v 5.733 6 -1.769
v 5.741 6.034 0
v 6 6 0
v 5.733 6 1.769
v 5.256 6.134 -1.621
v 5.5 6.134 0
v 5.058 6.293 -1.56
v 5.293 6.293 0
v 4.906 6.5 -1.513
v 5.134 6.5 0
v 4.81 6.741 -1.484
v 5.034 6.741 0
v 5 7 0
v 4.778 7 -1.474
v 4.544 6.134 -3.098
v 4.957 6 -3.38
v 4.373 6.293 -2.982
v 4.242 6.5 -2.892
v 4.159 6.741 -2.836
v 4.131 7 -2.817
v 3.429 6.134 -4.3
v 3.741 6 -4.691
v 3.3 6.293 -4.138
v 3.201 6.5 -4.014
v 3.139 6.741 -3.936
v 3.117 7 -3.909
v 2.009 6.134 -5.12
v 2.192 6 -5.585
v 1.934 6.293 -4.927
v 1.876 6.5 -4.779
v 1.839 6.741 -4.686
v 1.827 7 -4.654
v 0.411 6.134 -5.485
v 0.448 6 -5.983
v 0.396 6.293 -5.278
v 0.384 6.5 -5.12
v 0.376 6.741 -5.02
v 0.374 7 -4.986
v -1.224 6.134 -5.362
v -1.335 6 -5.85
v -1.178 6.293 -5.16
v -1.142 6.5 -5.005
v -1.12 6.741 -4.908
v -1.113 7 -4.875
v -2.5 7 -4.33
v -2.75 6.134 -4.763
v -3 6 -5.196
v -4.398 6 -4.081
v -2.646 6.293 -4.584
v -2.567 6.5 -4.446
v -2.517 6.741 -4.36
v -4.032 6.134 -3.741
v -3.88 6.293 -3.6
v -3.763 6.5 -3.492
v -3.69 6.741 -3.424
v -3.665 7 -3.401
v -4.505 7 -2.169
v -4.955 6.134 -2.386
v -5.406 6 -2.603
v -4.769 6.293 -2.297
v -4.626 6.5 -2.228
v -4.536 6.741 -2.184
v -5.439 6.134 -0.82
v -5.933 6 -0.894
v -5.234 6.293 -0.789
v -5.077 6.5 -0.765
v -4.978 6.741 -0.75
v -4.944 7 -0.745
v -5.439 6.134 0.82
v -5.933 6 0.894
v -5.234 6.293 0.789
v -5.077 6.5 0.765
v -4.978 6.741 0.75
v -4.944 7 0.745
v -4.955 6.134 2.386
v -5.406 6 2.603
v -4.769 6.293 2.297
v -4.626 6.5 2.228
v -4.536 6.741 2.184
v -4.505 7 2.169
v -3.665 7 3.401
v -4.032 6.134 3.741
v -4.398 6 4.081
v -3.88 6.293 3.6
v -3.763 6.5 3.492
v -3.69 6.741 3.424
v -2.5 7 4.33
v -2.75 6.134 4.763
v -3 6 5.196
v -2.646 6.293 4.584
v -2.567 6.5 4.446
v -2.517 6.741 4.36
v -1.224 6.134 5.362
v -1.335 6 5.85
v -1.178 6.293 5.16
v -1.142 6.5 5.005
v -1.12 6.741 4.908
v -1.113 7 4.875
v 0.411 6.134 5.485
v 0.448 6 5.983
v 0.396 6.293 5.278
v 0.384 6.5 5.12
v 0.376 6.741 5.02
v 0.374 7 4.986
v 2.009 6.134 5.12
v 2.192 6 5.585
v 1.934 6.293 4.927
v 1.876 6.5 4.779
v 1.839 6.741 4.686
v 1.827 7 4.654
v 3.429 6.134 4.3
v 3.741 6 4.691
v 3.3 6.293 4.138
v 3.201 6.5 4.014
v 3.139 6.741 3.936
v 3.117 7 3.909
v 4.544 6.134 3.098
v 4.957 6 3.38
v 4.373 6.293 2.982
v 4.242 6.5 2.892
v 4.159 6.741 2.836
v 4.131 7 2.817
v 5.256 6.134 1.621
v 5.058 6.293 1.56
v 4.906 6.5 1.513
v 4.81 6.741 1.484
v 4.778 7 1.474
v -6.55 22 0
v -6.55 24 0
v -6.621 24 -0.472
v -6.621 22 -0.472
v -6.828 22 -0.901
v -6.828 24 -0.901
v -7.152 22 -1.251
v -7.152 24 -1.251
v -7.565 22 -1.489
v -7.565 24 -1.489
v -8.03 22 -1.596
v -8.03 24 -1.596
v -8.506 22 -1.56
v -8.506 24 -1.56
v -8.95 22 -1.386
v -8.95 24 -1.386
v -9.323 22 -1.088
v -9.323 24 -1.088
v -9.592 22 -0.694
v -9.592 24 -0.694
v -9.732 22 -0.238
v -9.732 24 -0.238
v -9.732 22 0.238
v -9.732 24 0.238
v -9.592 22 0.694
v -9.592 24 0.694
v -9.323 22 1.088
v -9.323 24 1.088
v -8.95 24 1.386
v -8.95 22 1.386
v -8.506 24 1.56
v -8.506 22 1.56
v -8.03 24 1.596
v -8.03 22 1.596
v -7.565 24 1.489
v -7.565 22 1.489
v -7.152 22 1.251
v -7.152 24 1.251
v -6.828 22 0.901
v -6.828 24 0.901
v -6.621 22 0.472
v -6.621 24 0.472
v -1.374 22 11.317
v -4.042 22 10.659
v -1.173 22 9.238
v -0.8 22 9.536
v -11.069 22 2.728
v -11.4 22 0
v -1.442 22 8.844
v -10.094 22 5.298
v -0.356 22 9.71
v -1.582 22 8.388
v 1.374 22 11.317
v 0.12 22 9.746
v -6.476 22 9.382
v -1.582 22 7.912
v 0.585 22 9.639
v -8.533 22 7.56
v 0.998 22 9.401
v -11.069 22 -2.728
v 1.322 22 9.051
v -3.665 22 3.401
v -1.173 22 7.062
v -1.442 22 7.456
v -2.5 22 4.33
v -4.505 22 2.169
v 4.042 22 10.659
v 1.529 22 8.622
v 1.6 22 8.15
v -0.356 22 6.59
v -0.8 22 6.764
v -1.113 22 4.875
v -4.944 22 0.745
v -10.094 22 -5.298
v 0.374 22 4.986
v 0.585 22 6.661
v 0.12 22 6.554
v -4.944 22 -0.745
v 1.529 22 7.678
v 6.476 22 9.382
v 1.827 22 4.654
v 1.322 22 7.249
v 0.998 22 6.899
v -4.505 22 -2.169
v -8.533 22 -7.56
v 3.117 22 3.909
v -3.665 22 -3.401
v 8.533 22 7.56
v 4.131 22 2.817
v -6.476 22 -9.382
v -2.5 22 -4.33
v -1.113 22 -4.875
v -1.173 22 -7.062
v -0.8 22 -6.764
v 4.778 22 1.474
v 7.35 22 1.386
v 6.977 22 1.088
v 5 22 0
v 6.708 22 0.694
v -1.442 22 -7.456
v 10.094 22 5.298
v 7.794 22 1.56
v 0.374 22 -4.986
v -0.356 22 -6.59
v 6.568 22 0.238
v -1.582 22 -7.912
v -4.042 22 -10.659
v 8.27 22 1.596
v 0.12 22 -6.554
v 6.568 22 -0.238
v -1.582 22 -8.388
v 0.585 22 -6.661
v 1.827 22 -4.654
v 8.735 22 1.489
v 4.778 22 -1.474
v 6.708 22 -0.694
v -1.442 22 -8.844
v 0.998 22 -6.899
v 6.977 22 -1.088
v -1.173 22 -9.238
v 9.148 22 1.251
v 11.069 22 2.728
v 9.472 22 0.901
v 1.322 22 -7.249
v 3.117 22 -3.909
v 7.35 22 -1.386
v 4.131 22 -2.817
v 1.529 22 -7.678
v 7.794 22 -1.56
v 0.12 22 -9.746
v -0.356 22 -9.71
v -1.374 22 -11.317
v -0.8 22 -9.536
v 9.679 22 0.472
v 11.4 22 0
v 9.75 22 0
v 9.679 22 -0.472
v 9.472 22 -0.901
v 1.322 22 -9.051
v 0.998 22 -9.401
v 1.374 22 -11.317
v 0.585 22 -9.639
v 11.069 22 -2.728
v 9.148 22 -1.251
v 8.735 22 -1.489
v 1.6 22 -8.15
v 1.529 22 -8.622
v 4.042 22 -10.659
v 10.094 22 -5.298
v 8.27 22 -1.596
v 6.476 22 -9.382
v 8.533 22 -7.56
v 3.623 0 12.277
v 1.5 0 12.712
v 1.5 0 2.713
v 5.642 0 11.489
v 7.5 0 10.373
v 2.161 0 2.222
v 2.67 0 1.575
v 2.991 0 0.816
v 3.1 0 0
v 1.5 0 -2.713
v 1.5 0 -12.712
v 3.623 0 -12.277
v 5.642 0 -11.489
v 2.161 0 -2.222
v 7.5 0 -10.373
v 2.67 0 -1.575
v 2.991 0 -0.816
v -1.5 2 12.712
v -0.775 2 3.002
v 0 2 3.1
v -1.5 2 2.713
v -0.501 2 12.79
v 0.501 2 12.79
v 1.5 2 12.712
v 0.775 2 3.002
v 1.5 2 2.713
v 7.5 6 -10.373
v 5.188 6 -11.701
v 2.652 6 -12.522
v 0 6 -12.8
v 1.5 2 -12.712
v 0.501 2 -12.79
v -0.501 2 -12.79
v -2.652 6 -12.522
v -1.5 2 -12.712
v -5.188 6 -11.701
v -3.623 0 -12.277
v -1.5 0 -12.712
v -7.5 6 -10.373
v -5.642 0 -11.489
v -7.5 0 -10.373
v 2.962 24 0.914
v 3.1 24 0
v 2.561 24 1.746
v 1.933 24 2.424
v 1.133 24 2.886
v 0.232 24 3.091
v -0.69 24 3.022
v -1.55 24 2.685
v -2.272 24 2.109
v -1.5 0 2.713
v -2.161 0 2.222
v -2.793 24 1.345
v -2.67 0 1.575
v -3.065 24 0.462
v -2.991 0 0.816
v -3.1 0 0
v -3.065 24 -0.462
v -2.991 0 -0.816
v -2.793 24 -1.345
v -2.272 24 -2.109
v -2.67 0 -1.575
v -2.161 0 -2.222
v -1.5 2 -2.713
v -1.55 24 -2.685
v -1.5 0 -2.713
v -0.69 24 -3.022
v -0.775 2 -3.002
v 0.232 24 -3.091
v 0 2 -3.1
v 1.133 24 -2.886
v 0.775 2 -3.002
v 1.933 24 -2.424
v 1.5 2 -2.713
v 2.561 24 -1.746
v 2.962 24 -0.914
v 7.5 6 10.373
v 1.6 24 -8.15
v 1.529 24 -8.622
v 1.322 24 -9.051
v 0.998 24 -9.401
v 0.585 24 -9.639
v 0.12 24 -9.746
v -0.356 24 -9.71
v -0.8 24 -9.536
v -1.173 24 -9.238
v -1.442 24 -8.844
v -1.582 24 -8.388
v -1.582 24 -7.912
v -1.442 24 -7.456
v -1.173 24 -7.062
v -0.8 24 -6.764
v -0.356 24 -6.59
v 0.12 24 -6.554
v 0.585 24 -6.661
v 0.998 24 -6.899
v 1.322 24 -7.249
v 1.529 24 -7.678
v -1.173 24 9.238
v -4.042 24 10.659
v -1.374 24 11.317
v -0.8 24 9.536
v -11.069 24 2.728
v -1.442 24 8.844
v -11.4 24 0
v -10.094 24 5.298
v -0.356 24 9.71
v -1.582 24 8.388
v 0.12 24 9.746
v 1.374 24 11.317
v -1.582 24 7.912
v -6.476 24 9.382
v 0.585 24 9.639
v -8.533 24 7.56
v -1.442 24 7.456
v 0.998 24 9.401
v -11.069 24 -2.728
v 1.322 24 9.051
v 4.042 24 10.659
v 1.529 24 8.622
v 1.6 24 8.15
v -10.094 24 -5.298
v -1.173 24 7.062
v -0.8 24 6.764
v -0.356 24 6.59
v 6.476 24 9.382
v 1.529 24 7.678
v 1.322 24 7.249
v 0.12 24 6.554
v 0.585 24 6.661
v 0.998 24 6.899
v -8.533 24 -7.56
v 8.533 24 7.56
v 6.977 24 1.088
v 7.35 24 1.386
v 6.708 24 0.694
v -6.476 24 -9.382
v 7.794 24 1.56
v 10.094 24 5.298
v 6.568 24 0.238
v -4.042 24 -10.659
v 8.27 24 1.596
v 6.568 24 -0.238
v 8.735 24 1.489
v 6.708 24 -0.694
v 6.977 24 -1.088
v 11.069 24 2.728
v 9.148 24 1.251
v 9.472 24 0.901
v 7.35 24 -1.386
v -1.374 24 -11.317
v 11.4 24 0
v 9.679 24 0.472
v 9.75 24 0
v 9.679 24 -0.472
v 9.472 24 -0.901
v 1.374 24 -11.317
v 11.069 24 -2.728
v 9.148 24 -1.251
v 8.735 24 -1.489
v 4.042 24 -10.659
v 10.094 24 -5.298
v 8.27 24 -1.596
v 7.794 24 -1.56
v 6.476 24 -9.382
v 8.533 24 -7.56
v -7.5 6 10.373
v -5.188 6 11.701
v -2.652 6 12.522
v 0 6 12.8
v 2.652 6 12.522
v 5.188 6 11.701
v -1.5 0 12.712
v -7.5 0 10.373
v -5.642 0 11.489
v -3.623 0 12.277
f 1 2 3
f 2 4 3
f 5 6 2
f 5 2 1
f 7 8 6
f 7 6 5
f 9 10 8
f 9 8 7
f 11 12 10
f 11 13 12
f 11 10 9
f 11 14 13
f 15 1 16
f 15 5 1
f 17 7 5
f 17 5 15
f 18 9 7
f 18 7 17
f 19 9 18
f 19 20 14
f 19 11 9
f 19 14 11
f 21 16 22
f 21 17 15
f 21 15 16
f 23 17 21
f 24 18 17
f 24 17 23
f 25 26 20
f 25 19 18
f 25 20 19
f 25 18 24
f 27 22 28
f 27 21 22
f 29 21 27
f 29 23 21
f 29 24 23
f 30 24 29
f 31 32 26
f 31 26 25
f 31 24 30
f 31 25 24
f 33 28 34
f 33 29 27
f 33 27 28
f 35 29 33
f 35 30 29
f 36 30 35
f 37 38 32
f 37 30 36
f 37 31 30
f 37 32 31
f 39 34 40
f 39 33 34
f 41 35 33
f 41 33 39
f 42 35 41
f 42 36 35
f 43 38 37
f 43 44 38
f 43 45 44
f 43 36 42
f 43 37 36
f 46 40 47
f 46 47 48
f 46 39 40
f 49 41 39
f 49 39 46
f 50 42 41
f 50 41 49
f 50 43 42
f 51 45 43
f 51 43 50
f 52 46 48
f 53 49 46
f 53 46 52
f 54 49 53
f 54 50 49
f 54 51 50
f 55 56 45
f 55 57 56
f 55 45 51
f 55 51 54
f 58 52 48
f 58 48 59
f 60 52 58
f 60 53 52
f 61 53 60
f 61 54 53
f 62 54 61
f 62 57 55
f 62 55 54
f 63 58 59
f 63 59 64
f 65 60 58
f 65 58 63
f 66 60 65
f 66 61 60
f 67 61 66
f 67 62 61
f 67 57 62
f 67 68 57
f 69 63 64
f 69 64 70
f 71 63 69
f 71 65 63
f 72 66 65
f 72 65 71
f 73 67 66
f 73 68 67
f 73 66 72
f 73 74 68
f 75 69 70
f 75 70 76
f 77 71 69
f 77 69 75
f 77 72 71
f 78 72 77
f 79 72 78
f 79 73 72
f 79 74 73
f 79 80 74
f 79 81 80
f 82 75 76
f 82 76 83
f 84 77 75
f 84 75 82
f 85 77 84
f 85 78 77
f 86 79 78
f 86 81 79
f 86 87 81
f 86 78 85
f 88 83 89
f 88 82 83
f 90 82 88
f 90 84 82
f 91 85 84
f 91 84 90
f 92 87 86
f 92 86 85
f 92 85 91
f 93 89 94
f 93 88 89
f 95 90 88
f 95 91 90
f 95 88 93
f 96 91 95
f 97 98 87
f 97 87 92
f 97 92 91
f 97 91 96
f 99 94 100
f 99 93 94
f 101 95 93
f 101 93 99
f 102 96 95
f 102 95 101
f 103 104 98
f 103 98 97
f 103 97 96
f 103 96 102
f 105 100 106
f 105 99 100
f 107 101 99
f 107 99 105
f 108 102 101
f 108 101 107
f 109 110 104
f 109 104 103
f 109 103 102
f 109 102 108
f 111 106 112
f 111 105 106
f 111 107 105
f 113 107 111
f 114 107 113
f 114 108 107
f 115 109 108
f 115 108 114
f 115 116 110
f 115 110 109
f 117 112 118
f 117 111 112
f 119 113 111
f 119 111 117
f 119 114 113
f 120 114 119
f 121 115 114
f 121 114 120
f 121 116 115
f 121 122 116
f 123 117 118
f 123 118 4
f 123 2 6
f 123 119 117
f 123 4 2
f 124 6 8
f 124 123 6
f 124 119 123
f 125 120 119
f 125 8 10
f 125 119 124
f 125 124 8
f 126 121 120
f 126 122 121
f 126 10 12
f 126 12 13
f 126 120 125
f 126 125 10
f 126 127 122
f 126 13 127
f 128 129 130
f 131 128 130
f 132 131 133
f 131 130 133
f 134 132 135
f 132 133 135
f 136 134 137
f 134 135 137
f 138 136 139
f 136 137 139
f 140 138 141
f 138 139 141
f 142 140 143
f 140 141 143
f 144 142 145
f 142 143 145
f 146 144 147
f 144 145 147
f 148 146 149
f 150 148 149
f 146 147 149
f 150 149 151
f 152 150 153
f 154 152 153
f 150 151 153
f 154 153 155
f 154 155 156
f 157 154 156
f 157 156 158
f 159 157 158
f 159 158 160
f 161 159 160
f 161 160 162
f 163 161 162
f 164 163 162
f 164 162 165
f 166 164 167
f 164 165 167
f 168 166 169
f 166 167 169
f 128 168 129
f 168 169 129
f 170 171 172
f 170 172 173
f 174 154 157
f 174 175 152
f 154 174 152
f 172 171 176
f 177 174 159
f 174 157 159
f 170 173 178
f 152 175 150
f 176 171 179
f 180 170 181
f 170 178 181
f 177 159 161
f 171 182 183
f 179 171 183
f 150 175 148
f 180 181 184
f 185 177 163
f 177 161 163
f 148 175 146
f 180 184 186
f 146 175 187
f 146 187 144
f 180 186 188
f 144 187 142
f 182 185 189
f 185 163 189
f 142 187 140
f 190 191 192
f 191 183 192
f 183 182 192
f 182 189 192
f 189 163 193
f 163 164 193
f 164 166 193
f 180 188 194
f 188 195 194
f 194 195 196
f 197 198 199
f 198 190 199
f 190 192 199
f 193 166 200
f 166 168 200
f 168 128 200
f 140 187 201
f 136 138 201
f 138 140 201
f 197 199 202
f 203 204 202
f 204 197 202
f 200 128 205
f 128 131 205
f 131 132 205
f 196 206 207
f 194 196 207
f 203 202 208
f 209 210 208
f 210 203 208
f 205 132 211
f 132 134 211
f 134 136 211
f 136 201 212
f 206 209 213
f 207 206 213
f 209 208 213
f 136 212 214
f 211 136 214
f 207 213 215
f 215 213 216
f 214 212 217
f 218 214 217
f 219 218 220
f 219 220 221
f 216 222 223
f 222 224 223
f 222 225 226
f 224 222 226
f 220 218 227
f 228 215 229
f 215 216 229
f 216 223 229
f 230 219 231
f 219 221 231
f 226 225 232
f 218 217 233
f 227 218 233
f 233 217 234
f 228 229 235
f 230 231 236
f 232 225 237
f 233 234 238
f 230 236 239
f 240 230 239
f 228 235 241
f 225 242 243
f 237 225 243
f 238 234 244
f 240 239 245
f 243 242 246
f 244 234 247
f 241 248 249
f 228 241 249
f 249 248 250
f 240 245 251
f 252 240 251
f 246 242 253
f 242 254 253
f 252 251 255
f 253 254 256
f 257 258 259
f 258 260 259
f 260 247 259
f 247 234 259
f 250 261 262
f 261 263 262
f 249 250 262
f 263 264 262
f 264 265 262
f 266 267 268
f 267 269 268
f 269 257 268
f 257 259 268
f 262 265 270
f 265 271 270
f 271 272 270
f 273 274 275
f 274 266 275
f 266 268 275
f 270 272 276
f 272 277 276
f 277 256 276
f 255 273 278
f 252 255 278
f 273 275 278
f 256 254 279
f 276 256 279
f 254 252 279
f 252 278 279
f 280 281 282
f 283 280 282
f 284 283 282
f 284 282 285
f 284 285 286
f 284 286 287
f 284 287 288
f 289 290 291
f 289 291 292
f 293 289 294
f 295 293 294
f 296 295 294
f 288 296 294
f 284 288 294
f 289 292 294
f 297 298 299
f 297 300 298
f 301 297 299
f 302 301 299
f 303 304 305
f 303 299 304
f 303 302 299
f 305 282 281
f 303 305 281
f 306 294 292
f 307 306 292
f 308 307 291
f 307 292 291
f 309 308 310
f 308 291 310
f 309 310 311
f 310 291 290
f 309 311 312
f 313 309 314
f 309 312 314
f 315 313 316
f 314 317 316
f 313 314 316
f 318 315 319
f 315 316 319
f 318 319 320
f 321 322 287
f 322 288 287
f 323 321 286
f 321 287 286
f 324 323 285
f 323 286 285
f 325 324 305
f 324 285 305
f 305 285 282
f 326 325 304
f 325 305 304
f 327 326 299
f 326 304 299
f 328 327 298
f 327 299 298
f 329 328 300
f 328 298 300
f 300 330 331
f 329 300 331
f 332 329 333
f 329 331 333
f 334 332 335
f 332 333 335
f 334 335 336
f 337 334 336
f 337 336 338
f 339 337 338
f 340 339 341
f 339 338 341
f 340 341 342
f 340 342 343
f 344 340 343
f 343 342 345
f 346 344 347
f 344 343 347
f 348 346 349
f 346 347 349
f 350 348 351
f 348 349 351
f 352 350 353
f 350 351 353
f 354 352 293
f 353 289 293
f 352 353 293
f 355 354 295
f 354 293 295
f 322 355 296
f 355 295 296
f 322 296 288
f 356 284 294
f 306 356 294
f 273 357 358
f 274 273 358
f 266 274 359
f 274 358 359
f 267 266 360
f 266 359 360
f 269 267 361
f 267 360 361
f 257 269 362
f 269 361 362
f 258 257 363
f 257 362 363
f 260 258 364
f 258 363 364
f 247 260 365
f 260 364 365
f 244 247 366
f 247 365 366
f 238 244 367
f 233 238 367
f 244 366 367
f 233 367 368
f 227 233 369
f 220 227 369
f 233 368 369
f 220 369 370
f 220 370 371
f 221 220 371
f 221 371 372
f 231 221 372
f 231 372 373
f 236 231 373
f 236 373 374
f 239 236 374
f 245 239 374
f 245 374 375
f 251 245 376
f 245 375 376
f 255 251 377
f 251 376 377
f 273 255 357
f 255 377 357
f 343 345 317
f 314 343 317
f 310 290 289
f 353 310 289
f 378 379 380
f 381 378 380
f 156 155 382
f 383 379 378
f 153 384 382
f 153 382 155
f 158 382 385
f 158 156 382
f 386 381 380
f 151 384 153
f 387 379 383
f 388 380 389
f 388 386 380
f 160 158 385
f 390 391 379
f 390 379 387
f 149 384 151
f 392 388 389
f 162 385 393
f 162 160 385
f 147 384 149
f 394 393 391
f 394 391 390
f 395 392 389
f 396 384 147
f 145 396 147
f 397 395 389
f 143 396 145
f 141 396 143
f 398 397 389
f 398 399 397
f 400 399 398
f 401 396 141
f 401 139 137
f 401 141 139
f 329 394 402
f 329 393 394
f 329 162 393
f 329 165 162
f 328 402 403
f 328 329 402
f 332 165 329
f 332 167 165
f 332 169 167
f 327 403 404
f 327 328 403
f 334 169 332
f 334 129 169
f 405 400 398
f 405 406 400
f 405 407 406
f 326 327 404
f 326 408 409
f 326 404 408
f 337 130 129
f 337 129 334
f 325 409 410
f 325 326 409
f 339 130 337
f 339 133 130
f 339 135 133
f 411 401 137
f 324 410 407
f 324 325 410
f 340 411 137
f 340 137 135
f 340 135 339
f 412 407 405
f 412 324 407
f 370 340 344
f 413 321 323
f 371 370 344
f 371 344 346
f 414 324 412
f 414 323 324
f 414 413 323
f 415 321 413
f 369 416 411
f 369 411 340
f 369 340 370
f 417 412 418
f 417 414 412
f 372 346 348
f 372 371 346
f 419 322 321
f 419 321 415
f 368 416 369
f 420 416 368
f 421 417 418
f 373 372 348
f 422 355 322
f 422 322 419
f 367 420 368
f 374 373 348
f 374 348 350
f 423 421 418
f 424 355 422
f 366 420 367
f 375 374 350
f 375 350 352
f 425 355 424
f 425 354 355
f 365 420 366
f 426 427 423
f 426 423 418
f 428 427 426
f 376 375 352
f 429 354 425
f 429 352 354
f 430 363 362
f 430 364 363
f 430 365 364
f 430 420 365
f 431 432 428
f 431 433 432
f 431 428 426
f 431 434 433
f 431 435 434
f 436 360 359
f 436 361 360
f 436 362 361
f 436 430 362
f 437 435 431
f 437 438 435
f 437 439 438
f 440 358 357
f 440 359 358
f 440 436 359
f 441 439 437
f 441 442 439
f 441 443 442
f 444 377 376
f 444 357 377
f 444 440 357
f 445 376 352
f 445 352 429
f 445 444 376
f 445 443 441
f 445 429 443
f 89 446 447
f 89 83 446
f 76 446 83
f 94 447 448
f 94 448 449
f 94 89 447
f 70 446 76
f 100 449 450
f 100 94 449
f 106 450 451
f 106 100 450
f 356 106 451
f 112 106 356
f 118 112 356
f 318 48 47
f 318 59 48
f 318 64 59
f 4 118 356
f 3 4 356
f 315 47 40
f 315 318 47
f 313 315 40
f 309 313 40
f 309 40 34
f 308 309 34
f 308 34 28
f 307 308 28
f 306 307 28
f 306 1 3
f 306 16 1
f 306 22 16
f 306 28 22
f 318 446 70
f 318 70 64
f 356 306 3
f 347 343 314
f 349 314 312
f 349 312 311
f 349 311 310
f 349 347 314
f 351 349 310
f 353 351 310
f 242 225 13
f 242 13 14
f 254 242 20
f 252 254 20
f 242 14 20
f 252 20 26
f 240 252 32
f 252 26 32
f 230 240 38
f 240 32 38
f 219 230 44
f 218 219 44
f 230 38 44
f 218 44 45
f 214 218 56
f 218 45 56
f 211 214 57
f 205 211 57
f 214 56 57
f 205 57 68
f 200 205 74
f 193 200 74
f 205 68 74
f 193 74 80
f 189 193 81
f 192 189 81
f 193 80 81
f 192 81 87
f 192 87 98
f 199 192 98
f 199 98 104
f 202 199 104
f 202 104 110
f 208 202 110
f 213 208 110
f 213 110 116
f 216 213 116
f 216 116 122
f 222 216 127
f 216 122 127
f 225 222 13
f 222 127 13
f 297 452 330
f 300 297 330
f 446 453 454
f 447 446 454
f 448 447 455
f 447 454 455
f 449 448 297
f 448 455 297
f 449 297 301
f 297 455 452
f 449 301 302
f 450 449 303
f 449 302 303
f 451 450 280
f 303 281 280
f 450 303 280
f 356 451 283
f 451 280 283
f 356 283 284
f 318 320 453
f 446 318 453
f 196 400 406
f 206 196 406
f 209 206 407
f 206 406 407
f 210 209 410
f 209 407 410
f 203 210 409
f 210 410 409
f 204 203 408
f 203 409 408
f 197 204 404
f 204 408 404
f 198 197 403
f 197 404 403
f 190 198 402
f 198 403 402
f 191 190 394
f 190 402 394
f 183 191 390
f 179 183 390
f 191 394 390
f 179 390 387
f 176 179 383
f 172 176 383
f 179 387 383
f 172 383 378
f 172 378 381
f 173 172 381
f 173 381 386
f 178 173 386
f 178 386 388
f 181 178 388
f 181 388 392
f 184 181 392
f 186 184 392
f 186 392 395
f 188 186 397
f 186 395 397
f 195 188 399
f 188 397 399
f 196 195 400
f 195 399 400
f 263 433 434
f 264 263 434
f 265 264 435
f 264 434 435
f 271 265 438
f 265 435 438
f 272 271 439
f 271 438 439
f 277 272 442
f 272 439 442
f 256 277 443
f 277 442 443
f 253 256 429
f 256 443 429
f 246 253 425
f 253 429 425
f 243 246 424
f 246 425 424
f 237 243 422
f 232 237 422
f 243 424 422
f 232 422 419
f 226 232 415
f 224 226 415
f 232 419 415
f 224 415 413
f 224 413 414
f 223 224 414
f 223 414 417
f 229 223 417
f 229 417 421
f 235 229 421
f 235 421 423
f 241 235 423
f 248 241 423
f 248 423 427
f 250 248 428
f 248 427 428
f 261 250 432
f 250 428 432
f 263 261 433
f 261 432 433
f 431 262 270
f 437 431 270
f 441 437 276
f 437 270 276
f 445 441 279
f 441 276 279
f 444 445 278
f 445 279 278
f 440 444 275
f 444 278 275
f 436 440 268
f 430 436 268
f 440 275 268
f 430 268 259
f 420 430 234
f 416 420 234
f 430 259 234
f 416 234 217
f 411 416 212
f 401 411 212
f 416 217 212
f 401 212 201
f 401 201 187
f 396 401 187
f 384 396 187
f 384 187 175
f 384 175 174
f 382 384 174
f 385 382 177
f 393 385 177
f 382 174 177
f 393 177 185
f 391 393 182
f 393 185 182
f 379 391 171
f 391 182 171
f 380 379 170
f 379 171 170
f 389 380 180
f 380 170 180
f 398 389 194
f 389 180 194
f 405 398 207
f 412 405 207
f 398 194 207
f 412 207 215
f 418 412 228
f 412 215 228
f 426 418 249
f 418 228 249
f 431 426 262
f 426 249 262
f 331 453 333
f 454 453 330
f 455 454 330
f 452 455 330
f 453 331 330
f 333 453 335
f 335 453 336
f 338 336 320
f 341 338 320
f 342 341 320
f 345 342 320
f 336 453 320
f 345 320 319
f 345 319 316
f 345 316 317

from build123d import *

# Parameters (mm, degrees)
EXTRUDE_1_DEPTH     = 6
CUT_EXTRUDE_1_DEPTH = 2
SKETCH_4_R          = 5
EXTRUDE_2_DEPTH     = 16
CUT_EXTRUDE_3_REACH = 24
SKETCH_7_R          = 3.1
FILLET_1_R          = 1
SKETCH_8_R          = 11.4
EXTRUDE_3_DEPTH     = 2
SKETCH_9_R          = 3.1
CUT_EXTRUDE_4_DEPTH = 2
SKETCH_10_R         = 1.6
CUT_EXTRUDE_5_DEPTH = 2


with BuildPart() as part:
    # 草图1 → 凸台-拉伸1 (new body)
    with BuildSketch(Plane(origin=(0, 0, 0), x_dir=(1, 0, 0), z_dir=(0, 1, 0))):
        with BuildLine():
            Line((-7.5, 10.372559954), (-7.5, -10.372559954))
            ThreePointArc((-7.5, -10.372559954), (0, -12.8), (7.5, -10.372559954))
            Line((7.5, -10.372559954), (7.5, 10.372559954))
            ThreePointArc((7.5, 10.372559954), (0, 12.8), (-7.5, 10.372559954))
        make_face()
    extrude(amount=EXTRUDE_1_DEPTH)

    # 草图2 → 切除-拉伸1 (cut)
    with BuildSketch(Plane.XZ):
        with BuildLine():
            Line((-1.5, 12.711805537), (-1.5, -12.711805537))
            ThreePointArc((-1.5, -12.711805537), (0, -12.8), (1.5, -12.711805537))
            Line((1.5, -12.711805537), (1.5, 12.711805537))
            ThreePointArc((1.5, 12.711805537), (0, 12.8), (-1.5, 12.711805537))
        make_face()
    extrude(amount=-CUT_EXTRUDE_1_DEPTH, mode=Mode.SUBTRACT)

    # 草图4 → 凸台-拉伸2 (add)
    with BuildSketch(Plane(origin=(0, 6, 0), x_dir=(1, 0, 0), z_dir=(0, 1, 0))):
        Circle(SKETCH_4_R)
    extrude(amount=EXTRUDE_2_DEPTH)

    # 草图7 → 切除-拉伸3 (cut, up to next)
    with BuildSketch(Plane.XZ, mode=Mode.PRIVATE) as cut_extrude_3_sk1:
        Circle(SKETCH_7_R)
    cut_extrude_3_tool1 = extrude(cut_extrude_3_sk1.sketch, amount=-CUT_EXTRUDE_3_REACH, mode=Mode.PRIVATE) & part.part
    add(cut_extrude_3_tool1.solids().sort_by_distance((0, 0, 0))[0], mode=Mode.SUBTRACT)

    # 圆角1
    fillet_1_edges = [part.edges().sort_by_distance(p)[0] for p in [
        (-5, 6, 0),
    ]]
    fillet(fillet_1_edges, radius=FILLET_1_R)

    # 草图8 → 凸台-拉伸3 (add)
    with BuildSketch(Plane(origin=(0, 22, 0), x_dir=(1, 0, 0), z_dir=(0, 1, 0))):
        Circle(SKETCH_8_R)
    extrude(amount=EXTRUDE_3_DEPTH)

    # 草图9 → 切除-拉伸4 (cut)
    with BuildSketch(Plane.XZ.offset(-22)):
        Circle(SKETCH_9_R)
    extrude(amount=-CUT_EXTRUDE_4_DEPTH, mode=Mode.SUBTRACT)

    # 草图10 → 切除-拉伸5 (cut)
    with BuildSketch(Plane(origin=(0, 24, 0), x_dir=(1, 0, 0), z_dir=(0, 1, 0))):
        with Locations((0, 8.15)):
            Circle(SKETCH_10_R)
        with Locations((0, -8.15)):
            Circle(SKETCH_10_R)
        with Locations((-8.15, 0)):
            Circle(SKETCH_10_R)
        with Locations((8.15, 0)):
            Circle(SKETCH_10_R)
    extrude(amount=-CUT_EXTRUDE_5_DEPTH, mode=Mode.SUBTRACT)


solid = part.part
